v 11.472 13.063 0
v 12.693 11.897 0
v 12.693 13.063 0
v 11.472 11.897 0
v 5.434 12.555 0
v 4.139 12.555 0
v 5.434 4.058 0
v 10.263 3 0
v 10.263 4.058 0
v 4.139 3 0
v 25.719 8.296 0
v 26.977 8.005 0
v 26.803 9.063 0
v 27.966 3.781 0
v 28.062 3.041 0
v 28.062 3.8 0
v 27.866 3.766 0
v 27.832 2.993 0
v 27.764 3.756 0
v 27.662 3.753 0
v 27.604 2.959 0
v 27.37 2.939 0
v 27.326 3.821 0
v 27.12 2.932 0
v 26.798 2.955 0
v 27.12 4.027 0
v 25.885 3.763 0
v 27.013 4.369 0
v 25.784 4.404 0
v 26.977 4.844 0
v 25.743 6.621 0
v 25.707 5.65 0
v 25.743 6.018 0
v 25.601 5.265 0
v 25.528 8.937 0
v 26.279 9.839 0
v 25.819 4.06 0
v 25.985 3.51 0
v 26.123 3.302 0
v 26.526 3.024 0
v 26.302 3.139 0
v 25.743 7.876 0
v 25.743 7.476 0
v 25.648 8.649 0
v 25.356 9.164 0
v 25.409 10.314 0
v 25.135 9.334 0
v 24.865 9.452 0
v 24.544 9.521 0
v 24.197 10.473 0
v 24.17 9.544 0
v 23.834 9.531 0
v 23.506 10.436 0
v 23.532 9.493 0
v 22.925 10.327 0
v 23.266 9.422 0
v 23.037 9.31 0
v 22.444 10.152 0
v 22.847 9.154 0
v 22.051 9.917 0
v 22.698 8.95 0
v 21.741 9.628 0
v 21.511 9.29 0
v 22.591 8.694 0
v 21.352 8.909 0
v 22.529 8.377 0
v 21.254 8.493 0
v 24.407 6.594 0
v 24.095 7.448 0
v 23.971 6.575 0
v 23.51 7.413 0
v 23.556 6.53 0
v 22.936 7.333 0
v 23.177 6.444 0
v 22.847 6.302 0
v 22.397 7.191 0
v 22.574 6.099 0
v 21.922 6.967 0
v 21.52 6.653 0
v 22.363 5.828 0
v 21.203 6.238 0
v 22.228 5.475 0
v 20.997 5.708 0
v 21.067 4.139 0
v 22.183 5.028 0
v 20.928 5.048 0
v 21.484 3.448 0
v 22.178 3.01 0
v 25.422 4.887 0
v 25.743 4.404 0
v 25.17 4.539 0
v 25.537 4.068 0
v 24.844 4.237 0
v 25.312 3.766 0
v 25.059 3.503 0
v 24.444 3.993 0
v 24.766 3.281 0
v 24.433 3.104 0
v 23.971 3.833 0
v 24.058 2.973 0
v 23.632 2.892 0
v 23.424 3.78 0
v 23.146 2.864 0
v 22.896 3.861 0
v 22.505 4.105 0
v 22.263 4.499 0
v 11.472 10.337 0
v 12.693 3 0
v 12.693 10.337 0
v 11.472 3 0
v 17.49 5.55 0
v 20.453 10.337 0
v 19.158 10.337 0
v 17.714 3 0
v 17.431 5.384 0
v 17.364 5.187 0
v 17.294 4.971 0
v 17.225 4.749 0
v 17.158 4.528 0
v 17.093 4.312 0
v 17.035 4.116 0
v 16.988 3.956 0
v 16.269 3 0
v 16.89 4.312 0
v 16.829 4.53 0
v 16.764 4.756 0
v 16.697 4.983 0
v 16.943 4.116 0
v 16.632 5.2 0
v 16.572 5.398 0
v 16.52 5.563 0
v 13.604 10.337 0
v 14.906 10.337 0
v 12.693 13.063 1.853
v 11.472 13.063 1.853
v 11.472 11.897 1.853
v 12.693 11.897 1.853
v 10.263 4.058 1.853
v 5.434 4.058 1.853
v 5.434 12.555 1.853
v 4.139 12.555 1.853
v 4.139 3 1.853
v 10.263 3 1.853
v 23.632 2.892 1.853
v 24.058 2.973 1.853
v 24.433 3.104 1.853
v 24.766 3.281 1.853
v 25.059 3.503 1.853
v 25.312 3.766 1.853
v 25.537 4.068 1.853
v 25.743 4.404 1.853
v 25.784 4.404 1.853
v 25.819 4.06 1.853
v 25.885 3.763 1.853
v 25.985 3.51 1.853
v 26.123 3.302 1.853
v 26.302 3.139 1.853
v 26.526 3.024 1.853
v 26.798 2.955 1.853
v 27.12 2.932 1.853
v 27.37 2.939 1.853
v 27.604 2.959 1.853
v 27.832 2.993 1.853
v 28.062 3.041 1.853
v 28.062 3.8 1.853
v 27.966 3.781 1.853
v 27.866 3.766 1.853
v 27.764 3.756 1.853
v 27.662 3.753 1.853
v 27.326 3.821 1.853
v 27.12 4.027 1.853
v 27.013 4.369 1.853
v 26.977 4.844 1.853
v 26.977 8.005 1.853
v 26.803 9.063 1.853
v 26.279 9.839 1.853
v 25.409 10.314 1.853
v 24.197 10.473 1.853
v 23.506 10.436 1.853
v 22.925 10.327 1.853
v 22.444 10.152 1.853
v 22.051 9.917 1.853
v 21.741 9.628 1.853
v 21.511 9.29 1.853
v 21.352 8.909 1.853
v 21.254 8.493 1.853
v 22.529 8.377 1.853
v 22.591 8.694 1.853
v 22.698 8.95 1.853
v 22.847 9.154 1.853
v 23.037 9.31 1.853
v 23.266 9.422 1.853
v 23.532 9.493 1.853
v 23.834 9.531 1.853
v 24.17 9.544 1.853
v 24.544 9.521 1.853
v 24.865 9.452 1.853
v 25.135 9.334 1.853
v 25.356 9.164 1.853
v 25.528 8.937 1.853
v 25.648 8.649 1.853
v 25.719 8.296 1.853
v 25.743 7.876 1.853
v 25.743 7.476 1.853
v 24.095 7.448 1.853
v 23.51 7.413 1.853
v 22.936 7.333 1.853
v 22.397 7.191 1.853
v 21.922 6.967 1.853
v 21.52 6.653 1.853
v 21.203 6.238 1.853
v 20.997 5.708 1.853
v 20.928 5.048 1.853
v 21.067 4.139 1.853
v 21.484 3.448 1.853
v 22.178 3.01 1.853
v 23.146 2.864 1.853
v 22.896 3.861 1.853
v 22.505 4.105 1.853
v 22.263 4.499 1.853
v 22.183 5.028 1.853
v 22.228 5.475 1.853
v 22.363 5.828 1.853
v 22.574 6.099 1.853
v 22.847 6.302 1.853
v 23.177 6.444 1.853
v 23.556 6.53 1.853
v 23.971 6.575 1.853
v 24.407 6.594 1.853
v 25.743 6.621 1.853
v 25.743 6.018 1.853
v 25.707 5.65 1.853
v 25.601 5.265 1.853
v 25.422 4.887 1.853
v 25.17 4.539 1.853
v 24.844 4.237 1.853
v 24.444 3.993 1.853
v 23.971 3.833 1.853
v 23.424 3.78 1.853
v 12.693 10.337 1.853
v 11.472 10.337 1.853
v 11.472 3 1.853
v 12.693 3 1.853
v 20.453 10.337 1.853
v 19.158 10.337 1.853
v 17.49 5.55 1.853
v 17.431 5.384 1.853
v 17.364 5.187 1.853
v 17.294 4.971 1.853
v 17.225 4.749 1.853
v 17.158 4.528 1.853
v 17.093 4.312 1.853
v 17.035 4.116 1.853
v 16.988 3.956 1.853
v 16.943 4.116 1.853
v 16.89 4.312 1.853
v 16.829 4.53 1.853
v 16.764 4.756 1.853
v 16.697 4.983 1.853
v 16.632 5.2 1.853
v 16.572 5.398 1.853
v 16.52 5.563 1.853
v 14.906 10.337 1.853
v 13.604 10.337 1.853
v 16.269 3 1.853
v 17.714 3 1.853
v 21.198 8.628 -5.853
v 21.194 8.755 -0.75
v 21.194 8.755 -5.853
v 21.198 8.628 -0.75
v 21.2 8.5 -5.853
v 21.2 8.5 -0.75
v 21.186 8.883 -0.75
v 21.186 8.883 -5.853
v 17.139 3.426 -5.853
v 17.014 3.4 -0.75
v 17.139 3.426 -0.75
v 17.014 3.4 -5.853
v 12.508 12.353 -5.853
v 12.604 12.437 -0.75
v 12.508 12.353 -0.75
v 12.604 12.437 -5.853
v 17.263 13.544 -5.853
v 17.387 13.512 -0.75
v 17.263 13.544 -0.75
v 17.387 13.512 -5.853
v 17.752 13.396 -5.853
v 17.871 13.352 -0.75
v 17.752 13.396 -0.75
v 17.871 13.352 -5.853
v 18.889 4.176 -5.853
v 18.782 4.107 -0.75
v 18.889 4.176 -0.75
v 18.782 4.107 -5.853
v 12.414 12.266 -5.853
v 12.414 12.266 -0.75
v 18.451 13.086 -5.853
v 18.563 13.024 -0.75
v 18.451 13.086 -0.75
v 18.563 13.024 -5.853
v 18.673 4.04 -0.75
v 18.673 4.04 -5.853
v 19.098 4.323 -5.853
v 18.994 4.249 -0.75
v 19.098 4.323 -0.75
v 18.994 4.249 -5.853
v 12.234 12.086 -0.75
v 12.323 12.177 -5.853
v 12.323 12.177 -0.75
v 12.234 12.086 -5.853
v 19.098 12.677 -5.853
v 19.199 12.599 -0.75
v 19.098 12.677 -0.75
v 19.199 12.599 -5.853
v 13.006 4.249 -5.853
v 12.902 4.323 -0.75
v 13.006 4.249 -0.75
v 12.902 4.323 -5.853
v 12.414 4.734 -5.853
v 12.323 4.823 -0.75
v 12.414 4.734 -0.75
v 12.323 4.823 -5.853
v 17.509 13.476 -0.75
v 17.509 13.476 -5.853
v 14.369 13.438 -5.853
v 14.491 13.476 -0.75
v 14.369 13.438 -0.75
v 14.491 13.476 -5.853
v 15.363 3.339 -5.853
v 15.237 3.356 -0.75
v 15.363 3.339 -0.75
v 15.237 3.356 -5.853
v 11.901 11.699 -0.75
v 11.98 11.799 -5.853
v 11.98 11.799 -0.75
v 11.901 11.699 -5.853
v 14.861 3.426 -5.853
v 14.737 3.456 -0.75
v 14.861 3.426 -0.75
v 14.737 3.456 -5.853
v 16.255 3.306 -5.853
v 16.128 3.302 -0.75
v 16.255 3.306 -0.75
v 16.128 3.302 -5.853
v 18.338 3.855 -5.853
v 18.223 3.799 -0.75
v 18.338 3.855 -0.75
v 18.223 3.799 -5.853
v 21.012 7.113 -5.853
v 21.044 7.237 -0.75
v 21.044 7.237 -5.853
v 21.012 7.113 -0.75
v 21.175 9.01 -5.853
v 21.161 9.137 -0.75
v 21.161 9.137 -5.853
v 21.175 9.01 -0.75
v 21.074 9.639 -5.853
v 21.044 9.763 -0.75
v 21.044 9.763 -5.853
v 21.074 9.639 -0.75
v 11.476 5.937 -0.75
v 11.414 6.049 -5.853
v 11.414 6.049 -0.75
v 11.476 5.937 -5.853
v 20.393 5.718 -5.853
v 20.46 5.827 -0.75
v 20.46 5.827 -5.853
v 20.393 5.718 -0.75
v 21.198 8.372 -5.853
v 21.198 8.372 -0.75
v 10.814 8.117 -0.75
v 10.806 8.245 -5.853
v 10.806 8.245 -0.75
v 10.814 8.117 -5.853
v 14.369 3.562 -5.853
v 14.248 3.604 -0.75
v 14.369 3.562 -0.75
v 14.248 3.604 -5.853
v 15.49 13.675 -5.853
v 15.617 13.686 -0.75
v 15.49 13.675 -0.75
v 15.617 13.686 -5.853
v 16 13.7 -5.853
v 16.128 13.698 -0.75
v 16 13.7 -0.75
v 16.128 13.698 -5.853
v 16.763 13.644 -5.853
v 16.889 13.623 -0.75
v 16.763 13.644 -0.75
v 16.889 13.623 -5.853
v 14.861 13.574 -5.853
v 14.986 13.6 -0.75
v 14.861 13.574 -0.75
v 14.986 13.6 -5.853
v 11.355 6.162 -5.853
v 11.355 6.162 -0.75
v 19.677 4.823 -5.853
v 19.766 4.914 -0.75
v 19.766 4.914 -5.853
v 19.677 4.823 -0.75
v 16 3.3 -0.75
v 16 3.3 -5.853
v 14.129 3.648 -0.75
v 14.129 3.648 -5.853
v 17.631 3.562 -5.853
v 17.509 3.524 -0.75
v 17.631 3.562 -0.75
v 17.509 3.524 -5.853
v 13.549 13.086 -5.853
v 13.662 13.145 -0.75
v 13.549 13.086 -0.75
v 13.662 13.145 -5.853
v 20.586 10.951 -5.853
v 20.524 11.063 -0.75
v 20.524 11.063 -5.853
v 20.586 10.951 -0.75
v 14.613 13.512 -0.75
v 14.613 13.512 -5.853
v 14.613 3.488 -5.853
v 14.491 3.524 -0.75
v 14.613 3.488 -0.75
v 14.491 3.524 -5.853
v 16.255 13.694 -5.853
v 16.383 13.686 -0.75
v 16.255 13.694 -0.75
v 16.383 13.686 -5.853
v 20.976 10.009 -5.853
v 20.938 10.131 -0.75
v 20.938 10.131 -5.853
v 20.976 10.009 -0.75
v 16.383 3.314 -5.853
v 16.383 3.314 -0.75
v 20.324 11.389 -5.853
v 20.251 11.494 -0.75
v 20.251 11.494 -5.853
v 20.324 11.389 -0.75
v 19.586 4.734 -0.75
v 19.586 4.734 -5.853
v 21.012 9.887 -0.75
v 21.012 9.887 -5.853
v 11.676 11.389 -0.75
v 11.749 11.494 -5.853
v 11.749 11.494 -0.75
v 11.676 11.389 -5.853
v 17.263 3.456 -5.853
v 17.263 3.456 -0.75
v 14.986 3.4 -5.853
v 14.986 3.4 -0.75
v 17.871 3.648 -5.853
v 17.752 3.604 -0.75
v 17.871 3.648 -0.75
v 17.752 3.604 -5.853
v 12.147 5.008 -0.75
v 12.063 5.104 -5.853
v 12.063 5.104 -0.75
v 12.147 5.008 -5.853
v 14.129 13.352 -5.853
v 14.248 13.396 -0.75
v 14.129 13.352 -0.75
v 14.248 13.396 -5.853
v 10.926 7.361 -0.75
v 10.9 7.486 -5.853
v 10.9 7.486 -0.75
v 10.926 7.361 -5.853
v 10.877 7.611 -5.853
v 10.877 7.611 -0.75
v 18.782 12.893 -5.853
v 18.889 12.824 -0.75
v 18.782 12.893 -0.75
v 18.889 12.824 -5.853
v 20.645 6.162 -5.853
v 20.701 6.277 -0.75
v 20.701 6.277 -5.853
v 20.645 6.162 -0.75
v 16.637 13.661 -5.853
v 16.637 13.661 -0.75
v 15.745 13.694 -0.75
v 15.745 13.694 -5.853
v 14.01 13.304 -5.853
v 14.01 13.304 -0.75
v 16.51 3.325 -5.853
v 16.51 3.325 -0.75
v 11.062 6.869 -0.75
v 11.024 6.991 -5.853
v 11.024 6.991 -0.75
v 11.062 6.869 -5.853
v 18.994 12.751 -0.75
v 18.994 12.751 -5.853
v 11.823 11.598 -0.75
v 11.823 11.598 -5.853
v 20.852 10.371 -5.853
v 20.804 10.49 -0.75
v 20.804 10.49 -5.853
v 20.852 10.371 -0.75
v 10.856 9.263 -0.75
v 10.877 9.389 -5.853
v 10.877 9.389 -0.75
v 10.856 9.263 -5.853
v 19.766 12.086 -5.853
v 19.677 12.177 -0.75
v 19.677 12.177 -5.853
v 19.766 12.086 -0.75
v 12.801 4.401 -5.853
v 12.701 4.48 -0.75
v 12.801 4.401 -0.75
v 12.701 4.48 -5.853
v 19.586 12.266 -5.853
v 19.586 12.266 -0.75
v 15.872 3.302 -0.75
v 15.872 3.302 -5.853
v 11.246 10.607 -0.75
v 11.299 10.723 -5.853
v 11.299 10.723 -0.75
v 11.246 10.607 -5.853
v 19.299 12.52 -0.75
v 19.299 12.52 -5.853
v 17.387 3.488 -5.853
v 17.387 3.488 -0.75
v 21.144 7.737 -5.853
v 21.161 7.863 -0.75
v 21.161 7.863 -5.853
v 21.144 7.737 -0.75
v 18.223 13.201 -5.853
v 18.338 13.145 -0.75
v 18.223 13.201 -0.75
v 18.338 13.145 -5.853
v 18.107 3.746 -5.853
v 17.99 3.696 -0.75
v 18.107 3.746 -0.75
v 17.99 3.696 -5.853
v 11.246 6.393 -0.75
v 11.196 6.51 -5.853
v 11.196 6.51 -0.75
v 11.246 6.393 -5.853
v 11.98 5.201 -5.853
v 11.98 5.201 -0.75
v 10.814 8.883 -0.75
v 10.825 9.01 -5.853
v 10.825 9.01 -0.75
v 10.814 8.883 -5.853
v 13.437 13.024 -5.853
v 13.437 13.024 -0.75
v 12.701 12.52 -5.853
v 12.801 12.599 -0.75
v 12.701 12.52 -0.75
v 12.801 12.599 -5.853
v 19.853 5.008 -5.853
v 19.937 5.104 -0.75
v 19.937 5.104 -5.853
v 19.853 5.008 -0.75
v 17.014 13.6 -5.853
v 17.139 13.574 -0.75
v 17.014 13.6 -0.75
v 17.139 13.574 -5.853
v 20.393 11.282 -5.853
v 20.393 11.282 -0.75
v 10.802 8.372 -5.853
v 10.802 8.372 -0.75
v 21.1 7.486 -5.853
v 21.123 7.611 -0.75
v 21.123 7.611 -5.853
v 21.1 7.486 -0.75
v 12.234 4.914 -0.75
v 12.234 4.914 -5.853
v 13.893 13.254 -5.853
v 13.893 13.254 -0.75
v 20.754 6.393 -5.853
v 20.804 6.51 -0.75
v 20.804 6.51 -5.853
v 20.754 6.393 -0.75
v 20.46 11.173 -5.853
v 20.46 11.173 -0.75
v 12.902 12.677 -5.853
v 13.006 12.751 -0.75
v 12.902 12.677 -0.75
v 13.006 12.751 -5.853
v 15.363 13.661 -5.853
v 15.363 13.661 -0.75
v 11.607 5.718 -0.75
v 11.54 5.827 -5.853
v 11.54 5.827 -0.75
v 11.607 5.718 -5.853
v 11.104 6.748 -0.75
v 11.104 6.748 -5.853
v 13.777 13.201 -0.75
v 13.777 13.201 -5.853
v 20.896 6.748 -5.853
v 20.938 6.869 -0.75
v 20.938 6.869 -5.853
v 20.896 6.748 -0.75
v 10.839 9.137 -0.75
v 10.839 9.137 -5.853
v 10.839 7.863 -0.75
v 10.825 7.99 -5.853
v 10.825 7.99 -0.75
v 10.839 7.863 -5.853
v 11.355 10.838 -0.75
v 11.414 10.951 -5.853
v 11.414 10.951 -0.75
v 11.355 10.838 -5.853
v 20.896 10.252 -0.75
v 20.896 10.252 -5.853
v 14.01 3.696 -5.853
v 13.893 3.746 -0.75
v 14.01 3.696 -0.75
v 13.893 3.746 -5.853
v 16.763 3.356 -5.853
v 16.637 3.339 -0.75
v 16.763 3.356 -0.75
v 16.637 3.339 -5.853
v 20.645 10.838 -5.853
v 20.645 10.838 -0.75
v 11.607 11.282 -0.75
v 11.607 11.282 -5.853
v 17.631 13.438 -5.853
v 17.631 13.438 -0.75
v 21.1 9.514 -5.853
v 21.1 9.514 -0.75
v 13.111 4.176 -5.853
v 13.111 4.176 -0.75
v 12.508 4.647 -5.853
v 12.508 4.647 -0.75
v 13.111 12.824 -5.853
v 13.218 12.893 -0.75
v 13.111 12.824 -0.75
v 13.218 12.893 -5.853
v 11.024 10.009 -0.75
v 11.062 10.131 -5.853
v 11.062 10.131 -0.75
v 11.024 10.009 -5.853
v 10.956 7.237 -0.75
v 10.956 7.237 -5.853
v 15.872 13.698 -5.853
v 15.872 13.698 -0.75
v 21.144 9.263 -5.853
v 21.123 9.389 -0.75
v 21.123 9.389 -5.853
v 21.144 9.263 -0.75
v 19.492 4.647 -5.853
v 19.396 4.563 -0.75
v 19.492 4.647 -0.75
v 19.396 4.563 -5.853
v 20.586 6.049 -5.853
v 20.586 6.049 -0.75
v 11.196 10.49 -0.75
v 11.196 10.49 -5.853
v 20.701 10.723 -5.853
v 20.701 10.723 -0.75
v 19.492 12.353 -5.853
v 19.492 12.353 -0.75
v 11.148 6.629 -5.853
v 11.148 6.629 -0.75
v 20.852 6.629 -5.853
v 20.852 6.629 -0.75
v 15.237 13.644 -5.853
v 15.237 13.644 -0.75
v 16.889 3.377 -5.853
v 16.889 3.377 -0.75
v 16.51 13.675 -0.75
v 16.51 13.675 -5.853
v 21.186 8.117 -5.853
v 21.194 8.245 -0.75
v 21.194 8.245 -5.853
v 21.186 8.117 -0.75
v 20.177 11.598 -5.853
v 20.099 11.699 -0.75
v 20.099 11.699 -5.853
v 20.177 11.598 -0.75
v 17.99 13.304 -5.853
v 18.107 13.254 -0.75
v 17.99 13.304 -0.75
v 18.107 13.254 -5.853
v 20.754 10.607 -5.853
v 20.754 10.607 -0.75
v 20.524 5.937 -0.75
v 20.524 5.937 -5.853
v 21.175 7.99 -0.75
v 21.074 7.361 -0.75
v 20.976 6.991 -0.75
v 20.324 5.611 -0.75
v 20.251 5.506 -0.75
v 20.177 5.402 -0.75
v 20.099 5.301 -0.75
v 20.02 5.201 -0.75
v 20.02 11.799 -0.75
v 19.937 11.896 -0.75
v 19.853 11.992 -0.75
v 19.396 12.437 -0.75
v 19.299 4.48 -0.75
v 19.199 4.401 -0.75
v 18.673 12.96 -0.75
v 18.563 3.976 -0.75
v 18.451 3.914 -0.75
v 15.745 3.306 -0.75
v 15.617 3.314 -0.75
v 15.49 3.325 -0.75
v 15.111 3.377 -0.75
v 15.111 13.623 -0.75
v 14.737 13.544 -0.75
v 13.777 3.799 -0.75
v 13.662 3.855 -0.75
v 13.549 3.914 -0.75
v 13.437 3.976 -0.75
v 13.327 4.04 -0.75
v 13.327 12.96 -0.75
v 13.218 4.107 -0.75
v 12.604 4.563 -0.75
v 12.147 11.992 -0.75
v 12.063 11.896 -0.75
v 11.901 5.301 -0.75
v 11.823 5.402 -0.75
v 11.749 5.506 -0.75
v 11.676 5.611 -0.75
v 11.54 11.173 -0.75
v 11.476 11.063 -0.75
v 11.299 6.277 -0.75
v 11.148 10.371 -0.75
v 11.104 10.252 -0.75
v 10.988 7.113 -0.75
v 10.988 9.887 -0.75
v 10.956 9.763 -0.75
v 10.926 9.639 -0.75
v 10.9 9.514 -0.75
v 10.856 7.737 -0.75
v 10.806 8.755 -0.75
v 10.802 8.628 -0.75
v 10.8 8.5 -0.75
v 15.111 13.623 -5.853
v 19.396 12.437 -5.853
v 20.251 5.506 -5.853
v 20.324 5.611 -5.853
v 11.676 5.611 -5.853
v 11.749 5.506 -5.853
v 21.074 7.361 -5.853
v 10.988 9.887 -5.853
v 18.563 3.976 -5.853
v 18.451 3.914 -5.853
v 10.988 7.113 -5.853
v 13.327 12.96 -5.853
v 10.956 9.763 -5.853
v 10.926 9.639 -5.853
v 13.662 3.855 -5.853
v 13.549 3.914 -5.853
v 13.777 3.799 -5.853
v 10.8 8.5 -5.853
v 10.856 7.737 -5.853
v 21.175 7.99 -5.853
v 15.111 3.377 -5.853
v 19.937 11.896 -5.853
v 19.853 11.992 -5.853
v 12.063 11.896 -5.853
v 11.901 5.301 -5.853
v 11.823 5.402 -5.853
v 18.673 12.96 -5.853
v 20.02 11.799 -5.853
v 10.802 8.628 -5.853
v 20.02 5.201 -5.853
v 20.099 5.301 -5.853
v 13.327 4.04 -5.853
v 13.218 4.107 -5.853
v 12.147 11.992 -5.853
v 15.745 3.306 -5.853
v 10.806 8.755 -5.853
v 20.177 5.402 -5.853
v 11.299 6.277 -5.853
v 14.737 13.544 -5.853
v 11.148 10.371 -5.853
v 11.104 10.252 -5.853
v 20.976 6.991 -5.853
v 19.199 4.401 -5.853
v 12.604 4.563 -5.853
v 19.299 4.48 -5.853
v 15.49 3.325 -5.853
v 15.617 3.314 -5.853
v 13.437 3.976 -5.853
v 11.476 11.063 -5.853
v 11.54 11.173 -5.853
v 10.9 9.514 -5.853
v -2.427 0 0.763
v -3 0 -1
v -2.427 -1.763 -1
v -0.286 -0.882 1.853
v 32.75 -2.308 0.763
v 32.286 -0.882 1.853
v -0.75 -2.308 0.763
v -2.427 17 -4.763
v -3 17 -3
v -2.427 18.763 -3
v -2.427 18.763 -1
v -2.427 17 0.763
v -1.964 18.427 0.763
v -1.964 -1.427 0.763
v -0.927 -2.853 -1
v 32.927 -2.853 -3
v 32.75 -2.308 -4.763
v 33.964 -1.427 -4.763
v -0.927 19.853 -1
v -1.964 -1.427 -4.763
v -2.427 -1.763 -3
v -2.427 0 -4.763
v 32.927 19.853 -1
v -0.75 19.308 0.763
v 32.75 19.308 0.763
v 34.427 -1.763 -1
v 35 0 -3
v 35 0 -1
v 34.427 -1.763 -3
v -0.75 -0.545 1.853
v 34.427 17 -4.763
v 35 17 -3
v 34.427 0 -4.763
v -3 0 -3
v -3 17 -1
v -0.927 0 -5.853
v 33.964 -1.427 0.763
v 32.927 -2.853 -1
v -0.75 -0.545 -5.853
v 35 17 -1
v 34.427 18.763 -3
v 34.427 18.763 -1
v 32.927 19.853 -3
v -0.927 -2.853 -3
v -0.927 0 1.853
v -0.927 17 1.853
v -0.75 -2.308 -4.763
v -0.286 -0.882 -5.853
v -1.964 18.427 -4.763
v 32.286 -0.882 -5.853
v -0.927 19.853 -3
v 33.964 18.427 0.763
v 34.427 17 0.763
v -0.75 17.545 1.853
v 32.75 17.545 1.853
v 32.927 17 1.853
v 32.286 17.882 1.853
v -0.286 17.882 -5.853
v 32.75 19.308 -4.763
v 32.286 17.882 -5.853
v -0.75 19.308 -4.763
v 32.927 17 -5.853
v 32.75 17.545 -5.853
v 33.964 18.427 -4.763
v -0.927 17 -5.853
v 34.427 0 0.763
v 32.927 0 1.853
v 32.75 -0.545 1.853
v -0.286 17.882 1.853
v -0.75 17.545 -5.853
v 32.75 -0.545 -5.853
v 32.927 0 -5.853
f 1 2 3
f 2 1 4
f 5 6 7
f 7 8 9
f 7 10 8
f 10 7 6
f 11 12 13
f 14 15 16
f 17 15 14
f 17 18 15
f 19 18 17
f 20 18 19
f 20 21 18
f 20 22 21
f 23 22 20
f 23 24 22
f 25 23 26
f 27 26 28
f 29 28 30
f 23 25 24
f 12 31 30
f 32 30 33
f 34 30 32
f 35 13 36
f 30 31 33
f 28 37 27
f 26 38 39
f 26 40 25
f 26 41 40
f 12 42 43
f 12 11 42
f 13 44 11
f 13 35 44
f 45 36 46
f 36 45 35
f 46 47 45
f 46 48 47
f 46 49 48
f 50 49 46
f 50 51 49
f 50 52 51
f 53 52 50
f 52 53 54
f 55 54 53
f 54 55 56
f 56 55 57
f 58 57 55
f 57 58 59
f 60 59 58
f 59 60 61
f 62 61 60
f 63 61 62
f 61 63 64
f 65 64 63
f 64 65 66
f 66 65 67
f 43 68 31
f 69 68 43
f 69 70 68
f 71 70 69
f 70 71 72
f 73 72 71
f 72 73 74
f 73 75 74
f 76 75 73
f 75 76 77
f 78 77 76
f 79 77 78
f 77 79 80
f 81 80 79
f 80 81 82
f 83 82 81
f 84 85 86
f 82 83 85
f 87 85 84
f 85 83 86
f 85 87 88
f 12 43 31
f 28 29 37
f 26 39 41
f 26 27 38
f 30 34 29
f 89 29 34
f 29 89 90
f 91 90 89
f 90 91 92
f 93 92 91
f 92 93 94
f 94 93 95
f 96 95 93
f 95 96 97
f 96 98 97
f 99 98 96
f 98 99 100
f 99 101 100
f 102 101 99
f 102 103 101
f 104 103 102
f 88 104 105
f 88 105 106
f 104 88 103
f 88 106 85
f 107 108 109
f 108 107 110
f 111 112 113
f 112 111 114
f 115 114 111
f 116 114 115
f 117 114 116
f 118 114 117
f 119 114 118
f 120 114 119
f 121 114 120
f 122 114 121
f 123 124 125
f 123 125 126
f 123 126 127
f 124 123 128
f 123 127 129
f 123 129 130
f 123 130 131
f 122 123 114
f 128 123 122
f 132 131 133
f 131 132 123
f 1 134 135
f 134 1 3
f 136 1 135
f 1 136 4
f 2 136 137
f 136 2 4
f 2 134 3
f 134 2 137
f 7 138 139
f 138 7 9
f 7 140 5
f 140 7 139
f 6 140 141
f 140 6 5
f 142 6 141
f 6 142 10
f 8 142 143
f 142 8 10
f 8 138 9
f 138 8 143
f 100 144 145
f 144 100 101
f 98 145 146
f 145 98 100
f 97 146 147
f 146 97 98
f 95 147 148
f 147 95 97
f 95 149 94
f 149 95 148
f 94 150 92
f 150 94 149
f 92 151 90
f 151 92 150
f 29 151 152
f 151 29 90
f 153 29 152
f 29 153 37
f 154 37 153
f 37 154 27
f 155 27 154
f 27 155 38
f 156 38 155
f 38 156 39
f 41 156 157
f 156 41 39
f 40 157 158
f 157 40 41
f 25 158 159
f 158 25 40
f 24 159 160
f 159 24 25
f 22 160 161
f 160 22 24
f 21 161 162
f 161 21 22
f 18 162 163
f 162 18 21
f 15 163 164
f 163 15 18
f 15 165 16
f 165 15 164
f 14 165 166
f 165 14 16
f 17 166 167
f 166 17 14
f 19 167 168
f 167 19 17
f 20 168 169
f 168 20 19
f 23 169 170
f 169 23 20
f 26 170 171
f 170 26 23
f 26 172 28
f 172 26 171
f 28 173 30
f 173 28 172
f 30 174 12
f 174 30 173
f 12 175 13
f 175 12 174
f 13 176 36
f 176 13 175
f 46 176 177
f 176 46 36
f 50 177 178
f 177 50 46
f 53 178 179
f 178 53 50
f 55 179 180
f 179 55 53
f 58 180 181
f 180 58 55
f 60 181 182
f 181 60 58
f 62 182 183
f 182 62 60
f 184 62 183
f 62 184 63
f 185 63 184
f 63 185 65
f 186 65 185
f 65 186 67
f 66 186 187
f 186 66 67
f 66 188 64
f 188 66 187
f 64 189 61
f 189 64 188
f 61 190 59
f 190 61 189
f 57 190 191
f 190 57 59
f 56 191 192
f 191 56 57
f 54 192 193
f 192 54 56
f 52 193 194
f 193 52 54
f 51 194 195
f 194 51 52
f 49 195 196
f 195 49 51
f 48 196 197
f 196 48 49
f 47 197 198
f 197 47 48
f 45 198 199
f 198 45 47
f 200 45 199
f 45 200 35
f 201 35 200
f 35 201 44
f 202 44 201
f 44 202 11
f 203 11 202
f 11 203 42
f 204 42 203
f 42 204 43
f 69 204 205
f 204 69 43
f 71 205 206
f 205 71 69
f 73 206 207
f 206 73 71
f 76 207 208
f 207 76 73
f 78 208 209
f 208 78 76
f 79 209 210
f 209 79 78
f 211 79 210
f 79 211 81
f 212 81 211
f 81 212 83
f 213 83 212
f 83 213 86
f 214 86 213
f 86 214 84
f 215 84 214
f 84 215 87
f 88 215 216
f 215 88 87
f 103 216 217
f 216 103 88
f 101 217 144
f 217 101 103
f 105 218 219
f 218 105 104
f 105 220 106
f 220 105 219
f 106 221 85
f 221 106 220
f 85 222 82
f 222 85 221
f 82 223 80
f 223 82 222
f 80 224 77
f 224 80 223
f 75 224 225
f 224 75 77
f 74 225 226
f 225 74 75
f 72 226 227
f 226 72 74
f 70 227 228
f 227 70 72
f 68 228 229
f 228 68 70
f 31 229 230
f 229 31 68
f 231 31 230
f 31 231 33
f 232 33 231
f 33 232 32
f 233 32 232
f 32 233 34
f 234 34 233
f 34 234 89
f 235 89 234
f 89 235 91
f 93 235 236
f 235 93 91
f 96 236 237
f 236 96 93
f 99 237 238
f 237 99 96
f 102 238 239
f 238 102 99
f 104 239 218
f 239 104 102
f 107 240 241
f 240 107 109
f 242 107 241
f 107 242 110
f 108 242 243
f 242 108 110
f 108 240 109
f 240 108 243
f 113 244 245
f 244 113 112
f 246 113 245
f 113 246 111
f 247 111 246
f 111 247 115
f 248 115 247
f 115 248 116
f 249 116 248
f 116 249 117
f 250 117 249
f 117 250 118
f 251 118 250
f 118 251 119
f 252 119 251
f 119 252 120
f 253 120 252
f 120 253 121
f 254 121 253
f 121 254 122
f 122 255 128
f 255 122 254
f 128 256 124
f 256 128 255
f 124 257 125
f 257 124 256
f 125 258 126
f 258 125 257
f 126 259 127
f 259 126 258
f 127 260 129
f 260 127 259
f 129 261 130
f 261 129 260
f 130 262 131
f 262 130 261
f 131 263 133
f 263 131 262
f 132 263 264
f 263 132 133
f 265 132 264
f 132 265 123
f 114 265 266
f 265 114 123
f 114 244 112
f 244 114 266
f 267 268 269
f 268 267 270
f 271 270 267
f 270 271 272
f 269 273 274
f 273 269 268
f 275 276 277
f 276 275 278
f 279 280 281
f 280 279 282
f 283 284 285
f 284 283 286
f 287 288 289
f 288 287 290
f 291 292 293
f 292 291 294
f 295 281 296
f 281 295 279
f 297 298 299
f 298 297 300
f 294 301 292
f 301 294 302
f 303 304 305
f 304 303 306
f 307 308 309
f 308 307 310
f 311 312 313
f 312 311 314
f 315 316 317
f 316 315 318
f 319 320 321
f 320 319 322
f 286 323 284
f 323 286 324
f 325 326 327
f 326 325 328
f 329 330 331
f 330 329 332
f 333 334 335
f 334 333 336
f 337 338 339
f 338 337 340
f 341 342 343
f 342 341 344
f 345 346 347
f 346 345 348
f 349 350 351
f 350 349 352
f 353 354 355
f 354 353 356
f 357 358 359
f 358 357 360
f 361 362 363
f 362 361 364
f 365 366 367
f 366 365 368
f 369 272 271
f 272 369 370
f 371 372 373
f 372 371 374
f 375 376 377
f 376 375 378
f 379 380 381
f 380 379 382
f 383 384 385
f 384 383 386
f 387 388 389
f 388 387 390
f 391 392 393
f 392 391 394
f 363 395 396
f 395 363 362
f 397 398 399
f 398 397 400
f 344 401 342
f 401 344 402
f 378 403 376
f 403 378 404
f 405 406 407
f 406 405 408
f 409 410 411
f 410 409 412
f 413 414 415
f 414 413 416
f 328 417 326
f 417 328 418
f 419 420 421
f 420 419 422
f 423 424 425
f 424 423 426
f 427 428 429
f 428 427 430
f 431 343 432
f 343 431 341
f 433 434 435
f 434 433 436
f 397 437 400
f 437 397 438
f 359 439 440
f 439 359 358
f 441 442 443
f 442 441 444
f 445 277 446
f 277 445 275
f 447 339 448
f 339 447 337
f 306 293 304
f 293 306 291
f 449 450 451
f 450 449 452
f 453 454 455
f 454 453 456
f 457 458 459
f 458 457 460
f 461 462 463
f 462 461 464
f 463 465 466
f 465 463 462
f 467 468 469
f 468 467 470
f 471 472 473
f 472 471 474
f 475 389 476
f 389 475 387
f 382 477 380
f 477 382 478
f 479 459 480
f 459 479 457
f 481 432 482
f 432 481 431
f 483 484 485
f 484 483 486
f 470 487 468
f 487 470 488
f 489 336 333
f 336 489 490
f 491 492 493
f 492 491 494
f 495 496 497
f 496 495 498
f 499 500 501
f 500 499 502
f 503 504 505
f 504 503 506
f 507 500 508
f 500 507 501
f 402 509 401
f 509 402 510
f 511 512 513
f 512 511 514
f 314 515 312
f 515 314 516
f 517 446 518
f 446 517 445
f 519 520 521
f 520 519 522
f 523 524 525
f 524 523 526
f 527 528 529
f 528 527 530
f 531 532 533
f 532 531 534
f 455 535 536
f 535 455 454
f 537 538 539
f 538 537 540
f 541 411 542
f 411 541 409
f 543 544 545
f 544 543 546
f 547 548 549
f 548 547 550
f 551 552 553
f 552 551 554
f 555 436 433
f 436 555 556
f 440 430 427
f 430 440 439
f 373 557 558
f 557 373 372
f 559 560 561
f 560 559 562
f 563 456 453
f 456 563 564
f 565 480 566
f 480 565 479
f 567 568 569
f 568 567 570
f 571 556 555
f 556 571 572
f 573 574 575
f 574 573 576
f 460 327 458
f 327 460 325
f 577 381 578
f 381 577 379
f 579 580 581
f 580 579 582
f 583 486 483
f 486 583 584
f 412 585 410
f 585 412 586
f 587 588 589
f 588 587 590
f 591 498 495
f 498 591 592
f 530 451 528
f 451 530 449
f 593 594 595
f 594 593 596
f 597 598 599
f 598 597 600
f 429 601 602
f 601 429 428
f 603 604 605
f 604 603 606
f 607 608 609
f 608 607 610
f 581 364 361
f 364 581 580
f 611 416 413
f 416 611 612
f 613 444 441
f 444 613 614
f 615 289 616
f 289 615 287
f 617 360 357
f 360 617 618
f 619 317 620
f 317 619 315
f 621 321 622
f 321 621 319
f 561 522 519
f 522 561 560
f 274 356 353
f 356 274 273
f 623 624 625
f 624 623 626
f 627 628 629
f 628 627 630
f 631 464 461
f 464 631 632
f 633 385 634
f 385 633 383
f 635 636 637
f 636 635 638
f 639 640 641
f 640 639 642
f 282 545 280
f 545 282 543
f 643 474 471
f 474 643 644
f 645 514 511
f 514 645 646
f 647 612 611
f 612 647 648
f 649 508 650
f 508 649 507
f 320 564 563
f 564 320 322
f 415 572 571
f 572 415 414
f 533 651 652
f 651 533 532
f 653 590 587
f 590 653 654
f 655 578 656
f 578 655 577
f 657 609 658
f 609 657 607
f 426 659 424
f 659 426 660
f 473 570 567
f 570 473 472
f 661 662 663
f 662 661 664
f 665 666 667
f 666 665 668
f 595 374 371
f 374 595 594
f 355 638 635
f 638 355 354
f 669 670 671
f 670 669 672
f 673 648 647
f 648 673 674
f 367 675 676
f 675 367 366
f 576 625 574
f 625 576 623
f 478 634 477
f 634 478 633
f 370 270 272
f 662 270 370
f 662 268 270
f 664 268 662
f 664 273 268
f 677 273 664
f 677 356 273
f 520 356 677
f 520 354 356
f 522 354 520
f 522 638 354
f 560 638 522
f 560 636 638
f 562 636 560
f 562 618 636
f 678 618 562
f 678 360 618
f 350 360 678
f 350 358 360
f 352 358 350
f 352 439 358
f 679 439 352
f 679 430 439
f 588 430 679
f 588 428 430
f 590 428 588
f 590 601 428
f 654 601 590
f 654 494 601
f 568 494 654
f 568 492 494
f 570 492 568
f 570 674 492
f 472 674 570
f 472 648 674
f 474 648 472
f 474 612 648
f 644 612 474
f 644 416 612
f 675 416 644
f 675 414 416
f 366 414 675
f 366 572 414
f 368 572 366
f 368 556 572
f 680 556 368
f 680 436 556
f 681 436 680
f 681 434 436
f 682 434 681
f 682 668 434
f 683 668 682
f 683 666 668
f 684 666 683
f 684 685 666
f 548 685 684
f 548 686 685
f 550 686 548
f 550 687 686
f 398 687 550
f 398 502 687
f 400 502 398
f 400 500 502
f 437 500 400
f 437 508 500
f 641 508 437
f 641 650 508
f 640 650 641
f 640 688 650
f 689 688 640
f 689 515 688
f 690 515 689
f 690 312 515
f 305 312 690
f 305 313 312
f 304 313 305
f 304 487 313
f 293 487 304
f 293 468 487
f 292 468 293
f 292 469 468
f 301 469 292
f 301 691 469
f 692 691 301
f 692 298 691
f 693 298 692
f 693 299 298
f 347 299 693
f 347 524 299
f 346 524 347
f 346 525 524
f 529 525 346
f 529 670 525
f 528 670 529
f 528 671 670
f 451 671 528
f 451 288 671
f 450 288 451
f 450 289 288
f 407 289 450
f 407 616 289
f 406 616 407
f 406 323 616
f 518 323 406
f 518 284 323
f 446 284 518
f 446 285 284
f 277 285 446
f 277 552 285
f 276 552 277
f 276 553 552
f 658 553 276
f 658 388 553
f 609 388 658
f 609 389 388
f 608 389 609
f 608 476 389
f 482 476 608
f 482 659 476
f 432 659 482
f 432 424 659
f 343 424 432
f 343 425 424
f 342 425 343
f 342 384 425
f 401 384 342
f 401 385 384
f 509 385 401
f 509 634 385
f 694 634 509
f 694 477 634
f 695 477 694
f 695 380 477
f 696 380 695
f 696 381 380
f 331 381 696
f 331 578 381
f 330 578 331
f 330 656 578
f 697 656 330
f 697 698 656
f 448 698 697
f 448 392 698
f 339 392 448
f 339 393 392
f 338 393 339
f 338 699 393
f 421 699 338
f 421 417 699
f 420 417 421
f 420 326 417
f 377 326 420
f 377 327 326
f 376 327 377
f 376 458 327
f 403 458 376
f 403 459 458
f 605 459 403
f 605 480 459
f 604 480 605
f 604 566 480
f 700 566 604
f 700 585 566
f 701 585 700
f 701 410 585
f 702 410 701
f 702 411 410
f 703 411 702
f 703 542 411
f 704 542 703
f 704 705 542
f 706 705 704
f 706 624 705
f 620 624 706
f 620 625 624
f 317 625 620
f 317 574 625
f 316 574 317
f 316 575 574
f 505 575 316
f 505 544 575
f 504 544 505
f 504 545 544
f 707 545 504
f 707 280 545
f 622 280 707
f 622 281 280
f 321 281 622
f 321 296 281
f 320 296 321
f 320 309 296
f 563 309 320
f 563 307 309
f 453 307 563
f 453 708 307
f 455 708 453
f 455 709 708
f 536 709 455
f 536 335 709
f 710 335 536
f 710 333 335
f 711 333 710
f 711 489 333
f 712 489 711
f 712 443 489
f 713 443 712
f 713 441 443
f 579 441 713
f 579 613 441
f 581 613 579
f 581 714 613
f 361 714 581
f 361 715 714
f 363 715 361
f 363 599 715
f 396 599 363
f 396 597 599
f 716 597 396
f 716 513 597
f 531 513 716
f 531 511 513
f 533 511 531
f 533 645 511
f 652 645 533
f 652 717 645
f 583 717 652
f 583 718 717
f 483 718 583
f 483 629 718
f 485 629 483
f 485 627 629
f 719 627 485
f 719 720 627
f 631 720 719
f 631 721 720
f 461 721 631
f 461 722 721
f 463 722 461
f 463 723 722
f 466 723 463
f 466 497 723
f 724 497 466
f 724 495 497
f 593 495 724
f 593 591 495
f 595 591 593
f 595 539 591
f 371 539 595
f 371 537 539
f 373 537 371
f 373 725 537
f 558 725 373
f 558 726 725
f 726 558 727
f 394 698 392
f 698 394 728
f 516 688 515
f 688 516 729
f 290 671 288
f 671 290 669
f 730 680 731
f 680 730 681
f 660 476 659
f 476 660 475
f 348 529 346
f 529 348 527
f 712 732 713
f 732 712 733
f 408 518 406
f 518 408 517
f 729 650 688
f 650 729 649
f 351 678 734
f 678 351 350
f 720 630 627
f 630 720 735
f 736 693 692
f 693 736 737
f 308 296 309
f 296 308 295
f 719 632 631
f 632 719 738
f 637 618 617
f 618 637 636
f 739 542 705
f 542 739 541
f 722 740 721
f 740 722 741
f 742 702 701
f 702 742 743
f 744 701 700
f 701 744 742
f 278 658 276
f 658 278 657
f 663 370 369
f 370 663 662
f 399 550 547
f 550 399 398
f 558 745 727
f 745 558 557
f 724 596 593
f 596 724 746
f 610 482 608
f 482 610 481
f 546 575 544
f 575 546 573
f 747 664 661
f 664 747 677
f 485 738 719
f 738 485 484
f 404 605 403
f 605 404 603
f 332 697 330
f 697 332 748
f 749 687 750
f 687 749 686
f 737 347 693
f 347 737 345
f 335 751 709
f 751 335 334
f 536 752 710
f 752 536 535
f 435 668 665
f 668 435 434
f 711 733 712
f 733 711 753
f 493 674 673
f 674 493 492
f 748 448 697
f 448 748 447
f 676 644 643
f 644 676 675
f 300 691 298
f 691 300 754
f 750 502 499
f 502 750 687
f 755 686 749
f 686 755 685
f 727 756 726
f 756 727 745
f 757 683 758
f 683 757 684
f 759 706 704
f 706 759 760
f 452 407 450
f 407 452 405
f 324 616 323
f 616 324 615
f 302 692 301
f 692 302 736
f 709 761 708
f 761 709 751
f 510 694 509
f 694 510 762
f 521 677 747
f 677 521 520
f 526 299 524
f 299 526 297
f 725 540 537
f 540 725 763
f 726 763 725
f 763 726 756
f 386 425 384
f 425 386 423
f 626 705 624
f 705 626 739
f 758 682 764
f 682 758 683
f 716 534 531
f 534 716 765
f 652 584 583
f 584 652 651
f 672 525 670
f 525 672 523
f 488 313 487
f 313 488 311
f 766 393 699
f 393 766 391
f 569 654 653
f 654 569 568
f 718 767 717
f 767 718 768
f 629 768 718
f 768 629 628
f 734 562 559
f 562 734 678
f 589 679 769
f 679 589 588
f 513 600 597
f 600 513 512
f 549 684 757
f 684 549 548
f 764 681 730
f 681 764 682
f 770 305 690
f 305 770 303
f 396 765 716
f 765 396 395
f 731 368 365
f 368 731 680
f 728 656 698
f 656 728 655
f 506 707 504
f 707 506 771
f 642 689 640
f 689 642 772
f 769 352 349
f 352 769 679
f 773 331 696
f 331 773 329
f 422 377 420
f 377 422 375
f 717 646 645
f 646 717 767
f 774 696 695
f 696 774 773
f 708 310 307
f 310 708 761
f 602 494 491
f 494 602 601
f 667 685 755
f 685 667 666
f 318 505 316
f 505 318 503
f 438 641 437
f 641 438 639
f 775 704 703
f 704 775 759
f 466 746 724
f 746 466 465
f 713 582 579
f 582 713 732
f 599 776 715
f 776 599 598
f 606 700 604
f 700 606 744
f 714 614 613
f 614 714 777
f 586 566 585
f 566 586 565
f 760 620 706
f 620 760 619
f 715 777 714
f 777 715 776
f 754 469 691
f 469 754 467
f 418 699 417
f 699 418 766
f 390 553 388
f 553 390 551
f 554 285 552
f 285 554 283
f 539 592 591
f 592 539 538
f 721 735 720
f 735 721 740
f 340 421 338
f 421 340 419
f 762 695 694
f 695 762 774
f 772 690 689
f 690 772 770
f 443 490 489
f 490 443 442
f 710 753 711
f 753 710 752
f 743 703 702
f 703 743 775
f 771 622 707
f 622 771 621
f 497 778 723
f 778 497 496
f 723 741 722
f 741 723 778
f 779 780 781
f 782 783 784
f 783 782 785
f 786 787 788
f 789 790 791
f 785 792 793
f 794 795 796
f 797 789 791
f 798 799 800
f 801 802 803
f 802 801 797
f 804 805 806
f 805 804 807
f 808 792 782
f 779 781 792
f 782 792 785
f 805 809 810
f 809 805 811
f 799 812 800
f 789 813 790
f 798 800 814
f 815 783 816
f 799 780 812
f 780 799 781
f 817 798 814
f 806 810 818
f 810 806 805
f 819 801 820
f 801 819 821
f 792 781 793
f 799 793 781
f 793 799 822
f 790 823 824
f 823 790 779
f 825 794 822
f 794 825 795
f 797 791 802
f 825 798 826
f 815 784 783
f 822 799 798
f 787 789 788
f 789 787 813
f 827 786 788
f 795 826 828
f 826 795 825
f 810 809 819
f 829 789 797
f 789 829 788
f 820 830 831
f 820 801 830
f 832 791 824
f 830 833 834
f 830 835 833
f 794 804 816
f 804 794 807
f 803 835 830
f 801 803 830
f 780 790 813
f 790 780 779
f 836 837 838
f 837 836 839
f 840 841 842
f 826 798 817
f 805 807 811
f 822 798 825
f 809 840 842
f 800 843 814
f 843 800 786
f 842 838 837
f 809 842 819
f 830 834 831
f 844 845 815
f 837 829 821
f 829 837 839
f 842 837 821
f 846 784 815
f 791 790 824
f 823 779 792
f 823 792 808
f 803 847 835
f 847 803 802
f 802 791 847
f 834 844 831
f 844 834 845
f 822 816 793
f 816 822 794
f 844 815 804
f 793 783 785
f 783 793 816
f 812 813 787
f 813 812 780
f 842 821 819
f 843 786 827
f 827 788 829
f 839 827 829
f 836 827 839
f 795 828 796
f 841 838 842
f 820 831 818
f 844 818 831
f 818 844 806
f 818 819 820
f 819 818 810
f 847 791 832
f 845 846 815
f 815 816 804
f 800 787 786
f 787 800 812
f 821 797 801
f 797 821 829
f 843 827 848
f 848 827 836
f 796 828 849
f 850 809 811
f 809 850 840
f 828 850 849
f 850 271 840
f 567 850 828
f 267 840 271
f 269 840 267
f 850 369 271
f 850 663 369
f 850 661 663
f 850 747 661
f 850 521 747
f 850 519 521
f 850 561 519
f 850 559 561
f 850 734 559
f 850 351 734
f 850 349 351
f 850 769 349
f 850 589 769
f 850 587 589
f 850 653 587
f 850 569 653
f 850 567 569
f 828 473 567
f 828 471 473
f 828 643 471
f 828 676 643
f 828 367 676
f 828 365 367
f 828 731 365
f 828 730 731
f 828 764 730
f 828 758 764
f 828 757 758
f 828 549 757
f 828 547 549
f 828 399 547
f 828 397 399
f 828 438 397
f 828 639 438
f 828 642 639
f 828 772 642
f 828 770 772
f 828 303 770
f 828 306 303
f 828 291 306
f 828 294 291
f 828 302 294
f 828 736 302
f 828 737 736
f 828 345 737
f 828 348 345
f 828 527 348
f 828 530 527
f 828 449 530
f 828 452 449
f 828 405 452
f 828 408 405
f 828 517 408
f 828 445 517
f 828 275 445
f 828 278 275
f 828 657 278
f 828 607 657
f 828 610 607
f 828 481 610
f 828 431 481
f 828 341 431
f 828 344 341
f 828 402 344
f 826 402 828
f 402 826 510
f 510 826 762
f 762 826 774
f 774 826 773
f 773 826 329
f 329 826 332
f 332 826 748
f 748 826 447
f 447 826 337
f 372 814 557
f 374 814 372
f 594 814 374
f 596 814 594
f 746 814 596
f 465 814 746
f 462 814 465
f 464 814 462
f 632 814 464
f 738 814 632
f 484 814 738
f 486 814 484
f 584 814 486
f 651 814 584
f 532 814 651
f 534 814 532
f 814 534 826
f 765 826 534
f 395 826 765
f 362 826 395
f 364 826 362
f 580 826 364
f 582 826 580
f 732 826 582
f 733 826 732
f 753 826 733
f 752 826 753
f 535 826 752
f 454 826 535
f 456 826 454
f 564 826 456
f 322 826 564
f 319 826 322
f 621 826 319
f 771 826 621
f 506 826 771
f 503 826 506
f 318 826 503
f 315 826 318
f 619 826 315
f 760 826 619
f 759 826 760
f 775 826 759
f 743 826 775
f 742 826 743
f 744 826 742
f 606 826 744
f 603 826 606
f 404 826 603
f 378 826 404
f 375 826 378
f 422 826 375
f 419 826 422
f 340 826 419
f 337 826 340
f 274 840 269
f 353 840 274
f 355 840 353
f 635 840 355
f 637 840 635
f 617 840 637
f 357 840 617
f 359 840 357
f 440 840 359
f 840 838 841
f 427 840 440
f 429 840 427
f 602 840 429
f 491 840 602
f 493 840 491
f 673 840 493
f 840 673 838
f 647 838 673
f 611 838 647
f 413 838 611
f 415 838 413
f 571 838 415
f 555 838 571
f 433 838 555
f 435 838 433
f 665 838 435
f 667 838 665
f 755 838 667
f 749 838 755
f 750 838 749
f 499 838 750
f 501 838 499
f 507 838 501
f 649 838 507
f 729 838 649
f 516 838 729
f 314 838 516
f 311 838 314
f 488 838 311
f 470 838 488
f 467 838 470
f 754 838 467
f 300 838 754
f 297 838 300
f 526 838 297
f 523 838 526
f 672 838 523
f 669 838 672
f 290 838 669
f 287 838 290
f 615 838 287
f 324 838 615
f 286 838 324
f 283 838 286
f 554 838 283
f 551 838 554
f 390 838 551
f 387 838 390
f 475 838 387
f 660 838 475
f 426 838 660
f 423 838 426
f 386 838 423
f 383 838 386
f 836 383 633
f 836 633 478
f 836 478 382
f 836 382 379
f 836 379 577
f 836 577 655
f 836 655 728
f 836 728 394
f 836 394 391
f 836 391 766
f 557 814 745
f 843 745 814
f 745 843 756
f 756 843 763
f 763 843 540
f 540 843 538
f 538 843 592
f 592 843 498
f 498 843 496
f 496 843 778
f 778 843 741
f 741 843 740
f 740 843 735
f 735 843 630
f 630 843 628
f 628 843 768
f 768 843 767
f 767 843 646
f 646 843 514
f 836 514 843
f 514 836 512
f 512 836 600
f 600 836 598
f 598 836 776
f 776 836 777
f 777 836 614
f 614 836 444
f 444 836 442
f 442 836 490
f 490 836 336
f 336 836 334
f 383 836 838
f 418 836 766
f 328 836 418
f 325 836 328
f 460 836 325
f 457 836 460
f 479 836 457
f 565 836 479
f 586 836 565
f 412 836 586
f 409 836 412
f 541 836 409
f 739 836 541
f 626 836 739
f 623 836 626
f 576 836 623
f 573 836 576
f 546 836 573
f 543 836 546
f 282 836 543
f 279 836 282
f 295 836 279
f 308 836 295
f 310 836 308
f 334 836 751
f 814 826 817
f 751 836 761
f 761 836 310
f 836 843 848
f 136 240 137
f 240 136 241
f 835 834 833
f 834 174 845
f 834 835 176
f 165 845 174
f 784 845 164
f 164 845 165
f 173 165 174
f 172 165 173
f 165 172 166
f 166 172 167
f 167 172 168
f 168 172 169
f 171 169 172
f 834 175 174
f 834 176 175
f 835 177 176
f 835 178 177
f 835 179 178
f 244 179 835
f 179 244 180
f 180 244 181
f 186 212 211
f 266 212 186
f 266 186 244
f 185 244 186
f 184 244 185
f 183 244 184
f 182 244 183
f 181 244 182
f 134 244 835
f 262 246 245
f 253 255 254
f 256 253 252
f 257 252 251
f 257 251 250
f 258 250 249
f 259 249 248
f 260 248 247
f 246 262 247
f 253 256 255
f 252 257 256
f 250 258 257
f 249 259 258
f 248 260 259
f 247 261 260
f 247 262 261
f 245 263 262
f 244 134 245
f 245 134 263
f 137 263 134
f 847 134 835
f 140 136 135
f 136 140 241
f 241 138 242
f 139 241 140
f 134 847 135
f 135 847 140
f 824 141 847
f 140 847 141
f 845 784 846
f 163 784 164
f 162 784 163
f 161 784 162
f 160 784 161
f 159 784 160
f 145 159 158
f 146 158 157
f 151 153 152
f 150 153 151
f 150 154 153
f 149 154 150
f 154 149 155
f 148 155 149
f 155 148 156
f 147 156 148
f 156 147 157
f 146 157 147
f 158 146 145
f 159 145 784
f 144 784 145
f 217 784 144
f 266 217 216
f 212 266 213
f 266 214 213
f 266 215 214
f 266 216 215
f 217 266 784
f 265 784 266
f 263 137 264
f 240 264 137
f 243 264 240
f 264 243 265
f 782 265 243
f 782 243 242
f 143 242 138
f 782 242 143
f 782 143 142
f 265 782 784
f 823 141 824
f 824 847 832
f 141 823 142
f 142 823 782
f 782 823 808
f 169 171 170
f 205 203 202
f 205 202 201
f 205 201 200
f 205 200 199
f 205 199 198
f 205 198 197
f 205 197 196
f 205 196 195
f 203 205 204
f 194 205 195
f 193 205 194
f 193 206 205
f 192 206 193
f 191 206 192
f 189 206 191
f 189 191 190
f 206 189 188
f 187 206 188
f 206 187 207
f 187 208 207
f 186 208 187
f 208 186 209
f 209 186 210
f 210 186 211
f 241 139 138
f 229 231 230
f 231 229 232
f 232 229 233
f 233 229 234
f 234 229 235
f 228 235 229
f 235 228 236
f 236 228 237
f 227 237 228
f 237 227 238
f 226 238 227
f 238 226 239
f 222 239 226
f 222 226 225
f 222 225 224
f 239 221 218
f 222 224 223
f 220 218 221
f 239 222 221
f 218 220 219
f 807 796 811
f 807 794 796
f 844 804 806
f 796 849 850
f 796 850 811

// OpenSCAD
/*
Parametric Magnetic Name Sign
http://www.thingiverse.com/thing:1278048/

By Paul Houghton
Twitter: @mobile_rat
Email: paulirotta@gmail.com
Blog: http://paul-houghton.com/

Creative Commons Attribution ShareAlike License
https://creativecommons.org/licenses/by-sa/4.0/legalcode
*/


/* [Parametric Magnetic Name Sign options] */

// Sign text
text="Liva";

// Sign length
sign_length=32;

// Text X offset
text_x=3;

// Text Y offset
text_y=3;

// Sign width
sign_width=17;

// Sign thickness
sign_thickness=2; // +2*rounding as with other dimensions

// Radius of corner rounding
radius=3;

// Radius of magnet
magnet_radius=5.2;

// Thickness of magnet
magnet_thickness=5.15;

// Number of facets for approximating a sphere
$fn=10; // #sides to a circle. Try big and small numbers

sign(line1=text);

module sign(line1="Line1") {        
    difference() {
        translate([0,0,-radius]) minkowski() {
            cube([sign_length,sign_width,sign_thickness]);
            sphere(r=radius);
        }

        union() {
            translate([text_x,text_y,0]) linear_extrude(height=3) text(line1);
            magnet_hole();
        }
    }
 }

module magnet_hole() {
    translate([-radius+(sign_length + 2*radius)/2,-radius+(sign_width+2*radius)/2,-sign_thickness-radius-.9])
        cylinder($fn=256, r=magnet_radius, h=magnet_thickness);
}
